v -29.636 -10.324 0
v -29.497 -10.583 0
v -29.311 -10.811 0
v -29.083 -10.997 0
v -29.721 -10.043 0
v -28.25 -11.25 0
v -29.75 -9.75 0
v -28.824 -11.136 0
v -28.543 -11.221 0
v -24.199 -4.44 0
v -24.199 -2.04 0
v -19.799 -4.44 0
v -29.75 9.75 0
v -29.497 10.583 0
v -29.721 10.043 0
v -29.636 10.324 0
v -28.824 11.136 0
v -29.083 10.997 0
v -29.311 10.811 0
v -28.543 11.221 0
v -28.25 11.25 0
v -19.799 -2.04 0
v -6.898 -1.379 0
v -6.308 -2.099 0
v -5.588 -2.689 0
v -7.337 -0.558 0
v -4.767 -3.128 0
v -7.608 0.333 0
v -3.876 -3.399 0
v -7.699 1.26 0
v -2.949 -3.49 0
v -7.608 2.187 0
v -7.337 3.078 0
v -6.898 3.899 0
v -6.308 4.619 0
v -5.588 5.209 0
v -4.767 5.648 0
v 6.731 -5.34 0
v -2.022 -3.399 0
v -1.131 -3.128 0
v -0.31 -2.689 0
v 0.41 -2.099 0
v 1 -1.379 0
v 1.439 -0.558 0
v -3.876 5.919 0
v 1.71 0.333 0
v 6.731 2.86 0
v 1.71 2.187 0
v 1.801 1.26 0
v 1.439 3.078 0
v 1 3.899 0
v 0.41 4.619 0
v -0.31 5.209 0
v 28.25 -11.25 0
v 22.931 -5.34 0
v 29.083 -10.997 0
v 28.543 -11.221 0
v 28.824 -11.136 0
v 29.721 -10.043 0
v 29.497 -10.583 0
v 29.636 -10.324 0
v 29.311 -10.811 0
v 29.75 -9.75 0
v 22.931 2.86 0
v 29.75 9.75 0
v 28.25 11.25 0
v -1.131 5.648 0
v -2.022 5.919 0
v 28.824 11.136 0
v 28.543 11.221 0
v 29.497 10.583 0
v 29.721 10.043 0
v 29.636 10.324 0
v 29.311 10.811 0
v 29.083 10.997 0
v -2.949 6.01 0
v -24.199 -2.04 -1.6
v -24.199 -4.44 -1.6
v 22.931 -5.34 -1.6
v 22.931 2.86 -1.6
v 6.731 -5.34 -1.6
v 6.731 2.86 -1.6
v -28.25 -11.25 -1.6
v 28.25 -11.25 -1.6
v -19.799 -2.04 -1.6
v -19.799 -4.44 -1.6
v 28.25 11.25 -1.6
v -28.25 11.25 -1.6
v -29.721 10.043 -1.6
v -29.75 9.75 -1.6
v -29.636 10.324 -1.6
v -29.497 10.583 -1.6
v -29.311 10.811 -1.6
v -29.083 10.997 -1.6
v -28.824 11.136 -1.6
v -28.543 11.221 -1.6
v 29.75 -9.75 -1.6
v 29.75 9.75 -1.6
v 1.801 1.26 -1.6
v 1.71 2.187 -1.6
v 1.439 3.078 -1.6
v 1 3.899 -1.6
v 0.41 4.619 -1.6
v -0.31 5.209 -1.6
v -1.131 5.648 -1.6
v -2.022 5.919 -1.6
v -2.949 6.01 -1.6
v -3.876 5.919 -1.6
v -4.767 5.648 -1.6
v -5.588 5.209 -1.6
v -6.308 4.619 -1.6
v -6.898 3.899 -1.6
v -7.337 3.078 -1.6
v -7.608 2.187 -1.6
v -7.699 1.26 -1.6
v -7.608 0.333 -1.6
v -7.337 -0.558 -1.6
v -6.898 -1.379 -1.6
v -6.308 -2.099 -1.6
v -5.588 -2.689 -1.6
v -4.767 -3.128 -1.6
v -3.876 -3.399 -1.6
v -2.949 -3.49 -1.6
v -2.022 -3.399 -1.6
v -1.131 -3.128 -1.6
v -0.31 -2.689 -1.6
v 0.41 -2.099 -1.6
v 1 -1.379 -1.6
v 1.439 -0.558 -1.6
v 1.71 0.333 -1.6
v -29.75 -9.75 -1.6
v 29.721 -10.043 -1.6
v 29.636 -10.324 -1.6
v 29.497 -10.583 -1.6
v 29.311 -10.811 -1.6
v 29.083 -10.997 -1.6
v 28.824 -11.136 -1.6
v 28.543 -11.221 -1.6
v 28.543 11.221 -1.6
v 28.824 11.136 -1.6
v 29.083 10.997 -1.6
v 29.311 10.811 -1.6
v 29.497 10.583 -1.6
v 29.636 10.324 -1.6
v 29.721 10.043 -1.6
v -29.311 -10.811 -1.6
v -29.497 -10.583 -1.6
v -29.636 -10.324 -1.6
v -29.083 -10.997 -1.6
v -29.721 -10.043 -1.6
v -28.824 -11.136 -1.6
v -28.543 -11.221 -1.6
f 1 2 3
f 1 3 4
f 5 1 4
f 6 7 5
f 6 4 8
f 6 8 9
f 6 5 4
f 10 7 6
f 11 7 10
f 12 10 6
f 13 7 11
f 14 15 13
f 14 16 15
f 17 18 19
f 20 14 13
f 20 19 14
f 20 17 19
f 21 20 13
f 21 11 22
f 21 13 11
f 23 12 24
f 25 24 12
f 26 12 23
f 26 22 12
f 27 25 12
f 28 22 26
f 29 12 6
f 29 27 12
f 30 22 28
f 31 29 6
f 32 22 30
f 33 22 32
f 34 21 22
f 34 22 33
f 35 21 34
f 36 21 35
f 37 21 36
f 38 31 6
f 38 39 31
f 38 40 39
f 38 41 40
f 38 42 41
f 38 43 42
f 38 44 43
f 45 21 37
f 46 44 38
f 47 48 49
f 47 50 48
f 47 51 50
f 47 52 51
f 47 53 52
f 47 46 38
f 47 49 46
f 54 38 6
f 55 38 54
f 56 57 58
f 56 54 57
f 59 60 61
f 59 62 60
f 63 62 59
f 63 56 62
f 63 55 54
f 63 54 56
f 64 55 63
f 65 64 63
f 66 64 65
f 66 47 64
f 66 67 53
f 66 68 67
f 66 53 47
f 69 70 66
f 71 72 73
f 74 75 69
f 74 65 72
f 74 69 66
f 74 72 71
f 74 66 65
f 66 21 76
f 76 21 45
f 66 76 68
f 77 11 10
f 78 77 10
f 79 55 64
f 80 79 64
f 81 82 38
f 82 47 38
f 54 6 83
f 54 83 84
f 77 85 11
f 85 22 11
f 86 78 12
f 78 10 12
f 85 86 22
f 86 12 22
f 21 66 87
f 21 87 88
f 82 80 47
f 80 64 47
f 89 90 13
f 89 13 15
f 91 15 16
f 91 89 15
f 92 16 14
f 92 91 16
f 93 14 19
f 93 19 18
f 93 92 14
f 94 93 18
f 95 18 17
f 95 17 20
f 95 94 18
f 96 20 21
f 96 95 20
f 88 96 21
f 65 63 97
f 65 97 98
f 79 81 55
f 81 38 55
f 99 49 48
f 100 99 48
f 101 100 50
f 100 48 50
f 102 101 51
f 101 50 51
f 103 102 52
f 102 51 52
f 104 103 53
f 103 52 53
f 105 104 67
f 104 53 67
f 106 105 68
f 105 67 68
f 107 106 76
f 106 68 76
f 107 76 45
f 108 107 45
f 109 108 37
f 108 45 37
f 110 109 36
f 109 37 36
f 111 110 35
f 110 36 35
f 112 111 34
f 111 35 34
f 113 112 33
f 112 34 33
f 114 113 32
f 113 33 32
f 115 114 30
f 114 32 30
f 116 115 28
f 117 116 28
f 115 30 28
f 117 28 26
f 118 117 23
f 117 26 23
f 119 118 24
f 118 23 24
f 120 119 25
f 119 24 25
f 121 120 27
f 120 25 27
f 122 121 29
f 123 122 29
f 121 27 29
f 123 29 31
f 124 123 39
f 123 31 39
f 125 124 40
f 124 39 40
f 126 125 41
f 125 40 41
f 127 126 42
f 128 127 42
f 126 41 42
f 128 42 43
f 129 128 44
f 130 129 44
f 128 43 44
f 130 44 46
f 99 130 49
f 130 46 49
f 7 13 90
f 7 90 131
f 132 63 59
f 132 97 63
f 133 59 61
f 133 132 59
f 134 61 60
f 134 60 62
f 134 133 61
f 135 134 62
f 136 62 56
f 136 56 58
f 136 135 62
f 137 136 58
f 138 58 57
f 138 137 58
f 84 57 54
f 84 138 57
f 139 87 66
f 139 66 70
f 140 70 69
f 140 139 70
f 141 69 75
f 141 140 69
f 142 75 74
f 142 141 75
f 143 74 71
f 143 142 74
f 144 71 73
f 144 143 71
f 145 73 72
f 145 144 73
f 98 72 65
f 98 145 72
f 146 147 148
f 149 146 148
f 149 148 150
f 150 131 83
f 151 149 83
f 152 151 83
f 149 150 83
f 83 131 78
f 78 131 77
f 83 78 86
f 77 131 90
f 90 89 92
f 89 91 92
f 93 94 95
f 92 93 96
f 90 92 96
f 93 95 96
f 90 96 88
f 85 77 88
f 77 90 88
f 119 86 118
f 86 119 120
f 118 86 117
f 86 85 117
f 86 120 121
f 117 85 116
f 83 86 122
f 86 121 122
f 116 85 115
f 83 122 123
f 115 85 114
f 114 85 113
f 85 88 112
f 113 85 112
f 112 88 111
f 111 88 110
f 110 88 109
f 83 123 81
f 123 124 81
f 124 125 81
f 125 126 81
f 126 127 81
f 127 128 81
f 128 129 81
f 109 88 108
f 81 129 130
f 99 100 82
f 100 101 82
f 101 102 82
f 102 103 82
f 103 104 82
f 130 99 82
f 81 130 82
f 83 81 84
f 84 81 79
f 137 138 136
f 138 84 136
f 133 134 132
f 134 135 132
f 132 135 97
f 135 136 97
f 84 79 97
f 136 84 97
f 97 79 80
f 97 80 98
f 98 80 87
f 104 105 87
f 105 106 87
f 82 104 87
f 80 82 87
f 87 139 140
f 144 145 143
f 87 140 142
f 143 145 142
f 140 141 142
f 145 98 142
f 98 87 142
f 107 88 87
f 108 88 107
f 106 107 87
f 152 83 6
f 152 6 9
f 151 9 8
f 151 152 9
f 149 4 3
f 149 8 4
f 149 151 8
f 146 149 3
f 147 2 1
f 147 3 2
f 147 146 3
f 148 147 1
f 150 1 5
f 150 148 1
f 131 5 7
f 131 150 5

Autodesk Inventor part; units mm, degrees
ref_plane "YZ Plane" through (0, 0, 0) normal (1, 0, 0) x (0, 1, 0)
ref_plane "XZ Plane" through (0, 0, 0) normal (0, 1, 0) x (-1, 0, 0)
ref_plane "XY Plane" through (0, 0, 0) normal (0, 0, 1) x (1, 0, 0)
sketch "Sketch1" plane through (0, 0, 0) normal (0, 0, 1) x (1, 0, 0)
  line L0 (-29.75, -11.25) -> (29.75, -11.25)
  line L1 (29.75, -11.25) -> (29.75, 11.25)
  line L2 (29.75, 11.25) -> (-29.75, 11.25)
  line L3 (-29.75, 11.25) -> (-29.75, -11.25)
  line L4 (-29.75, -11.25) -> (29.75, 11.25) construction
  line L5 (29.75, -11.25) -> (-29.75, 11.25) construction
  point P0 (0, 0)
  dimension "d0" = 59.5
  dimension "d1" = 22.5
extrude "Extrusion1" add sketch "Sketch1" against normal blind 1.6
fillet "Fillet1" radius 1.5 4 edges at (29.75, 11.25, -0.8) (29.75, -11.25, -0.8) (-29.75, 11.25, -0.8) (-29.75, -11.25, -0.8)
sketch "Sketch2" plane through (0, 0, 0) normal (0, 0, 1) x (1, 0, 0)
  circle A0 centre (-2.949, 1.26) radius 4.75
  line L0 (-28.25, -11.25) -> (28.25, -11.25) projected
  line L1 (-29.75, 9.75) -> (-29.75, -9.75) projected
  line L2 (-24.199, -4.44) -> (-19.799, -4.44)
  line L3 (-19.799, -4.44) -> (-19.799, -2.04)
  line L4 (-19.799, -2.04) -> (-24.199, -2.04)
  line L5 (-24.199, -2.04) -> (-24.199, -4.44)
  line L6 (-24.199, -4.44) -> (-19.799, -2.04) construction
  line L7 (-19.799, -4.44) -> (-24.199, -2.04) construction
  point P0 (0, 0)
  point P1 (-28.349, -5.24)
  point P2 (-21.999, -3.24)
  dimension "d5" = 9.5
  dimension "d15" = 12.51
  dimension "d16" = 26.801
  dimension "d17" = 6.01
  dimension "d18" = 1.401
  dimension "d19" = 4.4
  dimension "d20" = 2.4
  dimension "d21" = 6.35
  dimension "d22" = 2
extrude "Extrusion2" cut sketch "Sketch2" against normal through all
sketch "Sketch4" plane through (0, 0, 0) normal (0, 0, 1) x (1, 0, 0)
  line L0 (-28.25, -11.25) -> (28.25, -11.25) projected
  line L1 (-29.75, 9.75) -> (-29.75, -9.75) projected
  line L2 (6.731, -5.34) -> (22.931, -5.34)
  line L3 (22.931, -5.34) -> (22.931, 2.86)
  line L4 (22.931, 2.86) -> (6.731, 2.86)
  line L5 (6.731, 2.86) -> (6.731, -5.34)
  line L6 (6.731, -5.34) -> (22.931, 2.86) construction
  line L7 (22.931, -5.34) -> (6.731, 2.86) construction
  point P0 (0, 0)
  point P1 (-28.349, -5.24)
  point P2 (14.831, -1.24)
  dimension "d23" = 6.01
  dimension "d24" = 1.401
  dimension "d25" = 16.2
  dimension "d26" = 8.2
  dimension "d28" = 43.18
  dimension "d29" = 0.1
extrude "Extrusion4" cut sketch "Sketch4" against normal through all
sketch "Sketch5" plane through (0, 0, -1.6) normal (0, 0, -1) x (-1, 0, 0)
  line L0 (-29.75, 11.25) -> (29.75, 11.25) construction
  line L1 (29.75, 11.25) -> (29.75, -11.2327) construction
  line L2 (29.75, -11.2327) -> (-29.75, -11.2327) construction
  line L3 (-29.75, -11.2327) -> (-29.75, 11.25) construction
  line L4 (28.25, 11.25) -> (-28.25, 11.25) projected
  line L5 (-29.75, 9.75) -> (-29.75, -9.75) projected
  line L6 (29.75, -9.75) -> (29.75, 9.75) projected
  point P0 (0, 0)
decal "Decal1"
properties part number "rearPlate_PP"
